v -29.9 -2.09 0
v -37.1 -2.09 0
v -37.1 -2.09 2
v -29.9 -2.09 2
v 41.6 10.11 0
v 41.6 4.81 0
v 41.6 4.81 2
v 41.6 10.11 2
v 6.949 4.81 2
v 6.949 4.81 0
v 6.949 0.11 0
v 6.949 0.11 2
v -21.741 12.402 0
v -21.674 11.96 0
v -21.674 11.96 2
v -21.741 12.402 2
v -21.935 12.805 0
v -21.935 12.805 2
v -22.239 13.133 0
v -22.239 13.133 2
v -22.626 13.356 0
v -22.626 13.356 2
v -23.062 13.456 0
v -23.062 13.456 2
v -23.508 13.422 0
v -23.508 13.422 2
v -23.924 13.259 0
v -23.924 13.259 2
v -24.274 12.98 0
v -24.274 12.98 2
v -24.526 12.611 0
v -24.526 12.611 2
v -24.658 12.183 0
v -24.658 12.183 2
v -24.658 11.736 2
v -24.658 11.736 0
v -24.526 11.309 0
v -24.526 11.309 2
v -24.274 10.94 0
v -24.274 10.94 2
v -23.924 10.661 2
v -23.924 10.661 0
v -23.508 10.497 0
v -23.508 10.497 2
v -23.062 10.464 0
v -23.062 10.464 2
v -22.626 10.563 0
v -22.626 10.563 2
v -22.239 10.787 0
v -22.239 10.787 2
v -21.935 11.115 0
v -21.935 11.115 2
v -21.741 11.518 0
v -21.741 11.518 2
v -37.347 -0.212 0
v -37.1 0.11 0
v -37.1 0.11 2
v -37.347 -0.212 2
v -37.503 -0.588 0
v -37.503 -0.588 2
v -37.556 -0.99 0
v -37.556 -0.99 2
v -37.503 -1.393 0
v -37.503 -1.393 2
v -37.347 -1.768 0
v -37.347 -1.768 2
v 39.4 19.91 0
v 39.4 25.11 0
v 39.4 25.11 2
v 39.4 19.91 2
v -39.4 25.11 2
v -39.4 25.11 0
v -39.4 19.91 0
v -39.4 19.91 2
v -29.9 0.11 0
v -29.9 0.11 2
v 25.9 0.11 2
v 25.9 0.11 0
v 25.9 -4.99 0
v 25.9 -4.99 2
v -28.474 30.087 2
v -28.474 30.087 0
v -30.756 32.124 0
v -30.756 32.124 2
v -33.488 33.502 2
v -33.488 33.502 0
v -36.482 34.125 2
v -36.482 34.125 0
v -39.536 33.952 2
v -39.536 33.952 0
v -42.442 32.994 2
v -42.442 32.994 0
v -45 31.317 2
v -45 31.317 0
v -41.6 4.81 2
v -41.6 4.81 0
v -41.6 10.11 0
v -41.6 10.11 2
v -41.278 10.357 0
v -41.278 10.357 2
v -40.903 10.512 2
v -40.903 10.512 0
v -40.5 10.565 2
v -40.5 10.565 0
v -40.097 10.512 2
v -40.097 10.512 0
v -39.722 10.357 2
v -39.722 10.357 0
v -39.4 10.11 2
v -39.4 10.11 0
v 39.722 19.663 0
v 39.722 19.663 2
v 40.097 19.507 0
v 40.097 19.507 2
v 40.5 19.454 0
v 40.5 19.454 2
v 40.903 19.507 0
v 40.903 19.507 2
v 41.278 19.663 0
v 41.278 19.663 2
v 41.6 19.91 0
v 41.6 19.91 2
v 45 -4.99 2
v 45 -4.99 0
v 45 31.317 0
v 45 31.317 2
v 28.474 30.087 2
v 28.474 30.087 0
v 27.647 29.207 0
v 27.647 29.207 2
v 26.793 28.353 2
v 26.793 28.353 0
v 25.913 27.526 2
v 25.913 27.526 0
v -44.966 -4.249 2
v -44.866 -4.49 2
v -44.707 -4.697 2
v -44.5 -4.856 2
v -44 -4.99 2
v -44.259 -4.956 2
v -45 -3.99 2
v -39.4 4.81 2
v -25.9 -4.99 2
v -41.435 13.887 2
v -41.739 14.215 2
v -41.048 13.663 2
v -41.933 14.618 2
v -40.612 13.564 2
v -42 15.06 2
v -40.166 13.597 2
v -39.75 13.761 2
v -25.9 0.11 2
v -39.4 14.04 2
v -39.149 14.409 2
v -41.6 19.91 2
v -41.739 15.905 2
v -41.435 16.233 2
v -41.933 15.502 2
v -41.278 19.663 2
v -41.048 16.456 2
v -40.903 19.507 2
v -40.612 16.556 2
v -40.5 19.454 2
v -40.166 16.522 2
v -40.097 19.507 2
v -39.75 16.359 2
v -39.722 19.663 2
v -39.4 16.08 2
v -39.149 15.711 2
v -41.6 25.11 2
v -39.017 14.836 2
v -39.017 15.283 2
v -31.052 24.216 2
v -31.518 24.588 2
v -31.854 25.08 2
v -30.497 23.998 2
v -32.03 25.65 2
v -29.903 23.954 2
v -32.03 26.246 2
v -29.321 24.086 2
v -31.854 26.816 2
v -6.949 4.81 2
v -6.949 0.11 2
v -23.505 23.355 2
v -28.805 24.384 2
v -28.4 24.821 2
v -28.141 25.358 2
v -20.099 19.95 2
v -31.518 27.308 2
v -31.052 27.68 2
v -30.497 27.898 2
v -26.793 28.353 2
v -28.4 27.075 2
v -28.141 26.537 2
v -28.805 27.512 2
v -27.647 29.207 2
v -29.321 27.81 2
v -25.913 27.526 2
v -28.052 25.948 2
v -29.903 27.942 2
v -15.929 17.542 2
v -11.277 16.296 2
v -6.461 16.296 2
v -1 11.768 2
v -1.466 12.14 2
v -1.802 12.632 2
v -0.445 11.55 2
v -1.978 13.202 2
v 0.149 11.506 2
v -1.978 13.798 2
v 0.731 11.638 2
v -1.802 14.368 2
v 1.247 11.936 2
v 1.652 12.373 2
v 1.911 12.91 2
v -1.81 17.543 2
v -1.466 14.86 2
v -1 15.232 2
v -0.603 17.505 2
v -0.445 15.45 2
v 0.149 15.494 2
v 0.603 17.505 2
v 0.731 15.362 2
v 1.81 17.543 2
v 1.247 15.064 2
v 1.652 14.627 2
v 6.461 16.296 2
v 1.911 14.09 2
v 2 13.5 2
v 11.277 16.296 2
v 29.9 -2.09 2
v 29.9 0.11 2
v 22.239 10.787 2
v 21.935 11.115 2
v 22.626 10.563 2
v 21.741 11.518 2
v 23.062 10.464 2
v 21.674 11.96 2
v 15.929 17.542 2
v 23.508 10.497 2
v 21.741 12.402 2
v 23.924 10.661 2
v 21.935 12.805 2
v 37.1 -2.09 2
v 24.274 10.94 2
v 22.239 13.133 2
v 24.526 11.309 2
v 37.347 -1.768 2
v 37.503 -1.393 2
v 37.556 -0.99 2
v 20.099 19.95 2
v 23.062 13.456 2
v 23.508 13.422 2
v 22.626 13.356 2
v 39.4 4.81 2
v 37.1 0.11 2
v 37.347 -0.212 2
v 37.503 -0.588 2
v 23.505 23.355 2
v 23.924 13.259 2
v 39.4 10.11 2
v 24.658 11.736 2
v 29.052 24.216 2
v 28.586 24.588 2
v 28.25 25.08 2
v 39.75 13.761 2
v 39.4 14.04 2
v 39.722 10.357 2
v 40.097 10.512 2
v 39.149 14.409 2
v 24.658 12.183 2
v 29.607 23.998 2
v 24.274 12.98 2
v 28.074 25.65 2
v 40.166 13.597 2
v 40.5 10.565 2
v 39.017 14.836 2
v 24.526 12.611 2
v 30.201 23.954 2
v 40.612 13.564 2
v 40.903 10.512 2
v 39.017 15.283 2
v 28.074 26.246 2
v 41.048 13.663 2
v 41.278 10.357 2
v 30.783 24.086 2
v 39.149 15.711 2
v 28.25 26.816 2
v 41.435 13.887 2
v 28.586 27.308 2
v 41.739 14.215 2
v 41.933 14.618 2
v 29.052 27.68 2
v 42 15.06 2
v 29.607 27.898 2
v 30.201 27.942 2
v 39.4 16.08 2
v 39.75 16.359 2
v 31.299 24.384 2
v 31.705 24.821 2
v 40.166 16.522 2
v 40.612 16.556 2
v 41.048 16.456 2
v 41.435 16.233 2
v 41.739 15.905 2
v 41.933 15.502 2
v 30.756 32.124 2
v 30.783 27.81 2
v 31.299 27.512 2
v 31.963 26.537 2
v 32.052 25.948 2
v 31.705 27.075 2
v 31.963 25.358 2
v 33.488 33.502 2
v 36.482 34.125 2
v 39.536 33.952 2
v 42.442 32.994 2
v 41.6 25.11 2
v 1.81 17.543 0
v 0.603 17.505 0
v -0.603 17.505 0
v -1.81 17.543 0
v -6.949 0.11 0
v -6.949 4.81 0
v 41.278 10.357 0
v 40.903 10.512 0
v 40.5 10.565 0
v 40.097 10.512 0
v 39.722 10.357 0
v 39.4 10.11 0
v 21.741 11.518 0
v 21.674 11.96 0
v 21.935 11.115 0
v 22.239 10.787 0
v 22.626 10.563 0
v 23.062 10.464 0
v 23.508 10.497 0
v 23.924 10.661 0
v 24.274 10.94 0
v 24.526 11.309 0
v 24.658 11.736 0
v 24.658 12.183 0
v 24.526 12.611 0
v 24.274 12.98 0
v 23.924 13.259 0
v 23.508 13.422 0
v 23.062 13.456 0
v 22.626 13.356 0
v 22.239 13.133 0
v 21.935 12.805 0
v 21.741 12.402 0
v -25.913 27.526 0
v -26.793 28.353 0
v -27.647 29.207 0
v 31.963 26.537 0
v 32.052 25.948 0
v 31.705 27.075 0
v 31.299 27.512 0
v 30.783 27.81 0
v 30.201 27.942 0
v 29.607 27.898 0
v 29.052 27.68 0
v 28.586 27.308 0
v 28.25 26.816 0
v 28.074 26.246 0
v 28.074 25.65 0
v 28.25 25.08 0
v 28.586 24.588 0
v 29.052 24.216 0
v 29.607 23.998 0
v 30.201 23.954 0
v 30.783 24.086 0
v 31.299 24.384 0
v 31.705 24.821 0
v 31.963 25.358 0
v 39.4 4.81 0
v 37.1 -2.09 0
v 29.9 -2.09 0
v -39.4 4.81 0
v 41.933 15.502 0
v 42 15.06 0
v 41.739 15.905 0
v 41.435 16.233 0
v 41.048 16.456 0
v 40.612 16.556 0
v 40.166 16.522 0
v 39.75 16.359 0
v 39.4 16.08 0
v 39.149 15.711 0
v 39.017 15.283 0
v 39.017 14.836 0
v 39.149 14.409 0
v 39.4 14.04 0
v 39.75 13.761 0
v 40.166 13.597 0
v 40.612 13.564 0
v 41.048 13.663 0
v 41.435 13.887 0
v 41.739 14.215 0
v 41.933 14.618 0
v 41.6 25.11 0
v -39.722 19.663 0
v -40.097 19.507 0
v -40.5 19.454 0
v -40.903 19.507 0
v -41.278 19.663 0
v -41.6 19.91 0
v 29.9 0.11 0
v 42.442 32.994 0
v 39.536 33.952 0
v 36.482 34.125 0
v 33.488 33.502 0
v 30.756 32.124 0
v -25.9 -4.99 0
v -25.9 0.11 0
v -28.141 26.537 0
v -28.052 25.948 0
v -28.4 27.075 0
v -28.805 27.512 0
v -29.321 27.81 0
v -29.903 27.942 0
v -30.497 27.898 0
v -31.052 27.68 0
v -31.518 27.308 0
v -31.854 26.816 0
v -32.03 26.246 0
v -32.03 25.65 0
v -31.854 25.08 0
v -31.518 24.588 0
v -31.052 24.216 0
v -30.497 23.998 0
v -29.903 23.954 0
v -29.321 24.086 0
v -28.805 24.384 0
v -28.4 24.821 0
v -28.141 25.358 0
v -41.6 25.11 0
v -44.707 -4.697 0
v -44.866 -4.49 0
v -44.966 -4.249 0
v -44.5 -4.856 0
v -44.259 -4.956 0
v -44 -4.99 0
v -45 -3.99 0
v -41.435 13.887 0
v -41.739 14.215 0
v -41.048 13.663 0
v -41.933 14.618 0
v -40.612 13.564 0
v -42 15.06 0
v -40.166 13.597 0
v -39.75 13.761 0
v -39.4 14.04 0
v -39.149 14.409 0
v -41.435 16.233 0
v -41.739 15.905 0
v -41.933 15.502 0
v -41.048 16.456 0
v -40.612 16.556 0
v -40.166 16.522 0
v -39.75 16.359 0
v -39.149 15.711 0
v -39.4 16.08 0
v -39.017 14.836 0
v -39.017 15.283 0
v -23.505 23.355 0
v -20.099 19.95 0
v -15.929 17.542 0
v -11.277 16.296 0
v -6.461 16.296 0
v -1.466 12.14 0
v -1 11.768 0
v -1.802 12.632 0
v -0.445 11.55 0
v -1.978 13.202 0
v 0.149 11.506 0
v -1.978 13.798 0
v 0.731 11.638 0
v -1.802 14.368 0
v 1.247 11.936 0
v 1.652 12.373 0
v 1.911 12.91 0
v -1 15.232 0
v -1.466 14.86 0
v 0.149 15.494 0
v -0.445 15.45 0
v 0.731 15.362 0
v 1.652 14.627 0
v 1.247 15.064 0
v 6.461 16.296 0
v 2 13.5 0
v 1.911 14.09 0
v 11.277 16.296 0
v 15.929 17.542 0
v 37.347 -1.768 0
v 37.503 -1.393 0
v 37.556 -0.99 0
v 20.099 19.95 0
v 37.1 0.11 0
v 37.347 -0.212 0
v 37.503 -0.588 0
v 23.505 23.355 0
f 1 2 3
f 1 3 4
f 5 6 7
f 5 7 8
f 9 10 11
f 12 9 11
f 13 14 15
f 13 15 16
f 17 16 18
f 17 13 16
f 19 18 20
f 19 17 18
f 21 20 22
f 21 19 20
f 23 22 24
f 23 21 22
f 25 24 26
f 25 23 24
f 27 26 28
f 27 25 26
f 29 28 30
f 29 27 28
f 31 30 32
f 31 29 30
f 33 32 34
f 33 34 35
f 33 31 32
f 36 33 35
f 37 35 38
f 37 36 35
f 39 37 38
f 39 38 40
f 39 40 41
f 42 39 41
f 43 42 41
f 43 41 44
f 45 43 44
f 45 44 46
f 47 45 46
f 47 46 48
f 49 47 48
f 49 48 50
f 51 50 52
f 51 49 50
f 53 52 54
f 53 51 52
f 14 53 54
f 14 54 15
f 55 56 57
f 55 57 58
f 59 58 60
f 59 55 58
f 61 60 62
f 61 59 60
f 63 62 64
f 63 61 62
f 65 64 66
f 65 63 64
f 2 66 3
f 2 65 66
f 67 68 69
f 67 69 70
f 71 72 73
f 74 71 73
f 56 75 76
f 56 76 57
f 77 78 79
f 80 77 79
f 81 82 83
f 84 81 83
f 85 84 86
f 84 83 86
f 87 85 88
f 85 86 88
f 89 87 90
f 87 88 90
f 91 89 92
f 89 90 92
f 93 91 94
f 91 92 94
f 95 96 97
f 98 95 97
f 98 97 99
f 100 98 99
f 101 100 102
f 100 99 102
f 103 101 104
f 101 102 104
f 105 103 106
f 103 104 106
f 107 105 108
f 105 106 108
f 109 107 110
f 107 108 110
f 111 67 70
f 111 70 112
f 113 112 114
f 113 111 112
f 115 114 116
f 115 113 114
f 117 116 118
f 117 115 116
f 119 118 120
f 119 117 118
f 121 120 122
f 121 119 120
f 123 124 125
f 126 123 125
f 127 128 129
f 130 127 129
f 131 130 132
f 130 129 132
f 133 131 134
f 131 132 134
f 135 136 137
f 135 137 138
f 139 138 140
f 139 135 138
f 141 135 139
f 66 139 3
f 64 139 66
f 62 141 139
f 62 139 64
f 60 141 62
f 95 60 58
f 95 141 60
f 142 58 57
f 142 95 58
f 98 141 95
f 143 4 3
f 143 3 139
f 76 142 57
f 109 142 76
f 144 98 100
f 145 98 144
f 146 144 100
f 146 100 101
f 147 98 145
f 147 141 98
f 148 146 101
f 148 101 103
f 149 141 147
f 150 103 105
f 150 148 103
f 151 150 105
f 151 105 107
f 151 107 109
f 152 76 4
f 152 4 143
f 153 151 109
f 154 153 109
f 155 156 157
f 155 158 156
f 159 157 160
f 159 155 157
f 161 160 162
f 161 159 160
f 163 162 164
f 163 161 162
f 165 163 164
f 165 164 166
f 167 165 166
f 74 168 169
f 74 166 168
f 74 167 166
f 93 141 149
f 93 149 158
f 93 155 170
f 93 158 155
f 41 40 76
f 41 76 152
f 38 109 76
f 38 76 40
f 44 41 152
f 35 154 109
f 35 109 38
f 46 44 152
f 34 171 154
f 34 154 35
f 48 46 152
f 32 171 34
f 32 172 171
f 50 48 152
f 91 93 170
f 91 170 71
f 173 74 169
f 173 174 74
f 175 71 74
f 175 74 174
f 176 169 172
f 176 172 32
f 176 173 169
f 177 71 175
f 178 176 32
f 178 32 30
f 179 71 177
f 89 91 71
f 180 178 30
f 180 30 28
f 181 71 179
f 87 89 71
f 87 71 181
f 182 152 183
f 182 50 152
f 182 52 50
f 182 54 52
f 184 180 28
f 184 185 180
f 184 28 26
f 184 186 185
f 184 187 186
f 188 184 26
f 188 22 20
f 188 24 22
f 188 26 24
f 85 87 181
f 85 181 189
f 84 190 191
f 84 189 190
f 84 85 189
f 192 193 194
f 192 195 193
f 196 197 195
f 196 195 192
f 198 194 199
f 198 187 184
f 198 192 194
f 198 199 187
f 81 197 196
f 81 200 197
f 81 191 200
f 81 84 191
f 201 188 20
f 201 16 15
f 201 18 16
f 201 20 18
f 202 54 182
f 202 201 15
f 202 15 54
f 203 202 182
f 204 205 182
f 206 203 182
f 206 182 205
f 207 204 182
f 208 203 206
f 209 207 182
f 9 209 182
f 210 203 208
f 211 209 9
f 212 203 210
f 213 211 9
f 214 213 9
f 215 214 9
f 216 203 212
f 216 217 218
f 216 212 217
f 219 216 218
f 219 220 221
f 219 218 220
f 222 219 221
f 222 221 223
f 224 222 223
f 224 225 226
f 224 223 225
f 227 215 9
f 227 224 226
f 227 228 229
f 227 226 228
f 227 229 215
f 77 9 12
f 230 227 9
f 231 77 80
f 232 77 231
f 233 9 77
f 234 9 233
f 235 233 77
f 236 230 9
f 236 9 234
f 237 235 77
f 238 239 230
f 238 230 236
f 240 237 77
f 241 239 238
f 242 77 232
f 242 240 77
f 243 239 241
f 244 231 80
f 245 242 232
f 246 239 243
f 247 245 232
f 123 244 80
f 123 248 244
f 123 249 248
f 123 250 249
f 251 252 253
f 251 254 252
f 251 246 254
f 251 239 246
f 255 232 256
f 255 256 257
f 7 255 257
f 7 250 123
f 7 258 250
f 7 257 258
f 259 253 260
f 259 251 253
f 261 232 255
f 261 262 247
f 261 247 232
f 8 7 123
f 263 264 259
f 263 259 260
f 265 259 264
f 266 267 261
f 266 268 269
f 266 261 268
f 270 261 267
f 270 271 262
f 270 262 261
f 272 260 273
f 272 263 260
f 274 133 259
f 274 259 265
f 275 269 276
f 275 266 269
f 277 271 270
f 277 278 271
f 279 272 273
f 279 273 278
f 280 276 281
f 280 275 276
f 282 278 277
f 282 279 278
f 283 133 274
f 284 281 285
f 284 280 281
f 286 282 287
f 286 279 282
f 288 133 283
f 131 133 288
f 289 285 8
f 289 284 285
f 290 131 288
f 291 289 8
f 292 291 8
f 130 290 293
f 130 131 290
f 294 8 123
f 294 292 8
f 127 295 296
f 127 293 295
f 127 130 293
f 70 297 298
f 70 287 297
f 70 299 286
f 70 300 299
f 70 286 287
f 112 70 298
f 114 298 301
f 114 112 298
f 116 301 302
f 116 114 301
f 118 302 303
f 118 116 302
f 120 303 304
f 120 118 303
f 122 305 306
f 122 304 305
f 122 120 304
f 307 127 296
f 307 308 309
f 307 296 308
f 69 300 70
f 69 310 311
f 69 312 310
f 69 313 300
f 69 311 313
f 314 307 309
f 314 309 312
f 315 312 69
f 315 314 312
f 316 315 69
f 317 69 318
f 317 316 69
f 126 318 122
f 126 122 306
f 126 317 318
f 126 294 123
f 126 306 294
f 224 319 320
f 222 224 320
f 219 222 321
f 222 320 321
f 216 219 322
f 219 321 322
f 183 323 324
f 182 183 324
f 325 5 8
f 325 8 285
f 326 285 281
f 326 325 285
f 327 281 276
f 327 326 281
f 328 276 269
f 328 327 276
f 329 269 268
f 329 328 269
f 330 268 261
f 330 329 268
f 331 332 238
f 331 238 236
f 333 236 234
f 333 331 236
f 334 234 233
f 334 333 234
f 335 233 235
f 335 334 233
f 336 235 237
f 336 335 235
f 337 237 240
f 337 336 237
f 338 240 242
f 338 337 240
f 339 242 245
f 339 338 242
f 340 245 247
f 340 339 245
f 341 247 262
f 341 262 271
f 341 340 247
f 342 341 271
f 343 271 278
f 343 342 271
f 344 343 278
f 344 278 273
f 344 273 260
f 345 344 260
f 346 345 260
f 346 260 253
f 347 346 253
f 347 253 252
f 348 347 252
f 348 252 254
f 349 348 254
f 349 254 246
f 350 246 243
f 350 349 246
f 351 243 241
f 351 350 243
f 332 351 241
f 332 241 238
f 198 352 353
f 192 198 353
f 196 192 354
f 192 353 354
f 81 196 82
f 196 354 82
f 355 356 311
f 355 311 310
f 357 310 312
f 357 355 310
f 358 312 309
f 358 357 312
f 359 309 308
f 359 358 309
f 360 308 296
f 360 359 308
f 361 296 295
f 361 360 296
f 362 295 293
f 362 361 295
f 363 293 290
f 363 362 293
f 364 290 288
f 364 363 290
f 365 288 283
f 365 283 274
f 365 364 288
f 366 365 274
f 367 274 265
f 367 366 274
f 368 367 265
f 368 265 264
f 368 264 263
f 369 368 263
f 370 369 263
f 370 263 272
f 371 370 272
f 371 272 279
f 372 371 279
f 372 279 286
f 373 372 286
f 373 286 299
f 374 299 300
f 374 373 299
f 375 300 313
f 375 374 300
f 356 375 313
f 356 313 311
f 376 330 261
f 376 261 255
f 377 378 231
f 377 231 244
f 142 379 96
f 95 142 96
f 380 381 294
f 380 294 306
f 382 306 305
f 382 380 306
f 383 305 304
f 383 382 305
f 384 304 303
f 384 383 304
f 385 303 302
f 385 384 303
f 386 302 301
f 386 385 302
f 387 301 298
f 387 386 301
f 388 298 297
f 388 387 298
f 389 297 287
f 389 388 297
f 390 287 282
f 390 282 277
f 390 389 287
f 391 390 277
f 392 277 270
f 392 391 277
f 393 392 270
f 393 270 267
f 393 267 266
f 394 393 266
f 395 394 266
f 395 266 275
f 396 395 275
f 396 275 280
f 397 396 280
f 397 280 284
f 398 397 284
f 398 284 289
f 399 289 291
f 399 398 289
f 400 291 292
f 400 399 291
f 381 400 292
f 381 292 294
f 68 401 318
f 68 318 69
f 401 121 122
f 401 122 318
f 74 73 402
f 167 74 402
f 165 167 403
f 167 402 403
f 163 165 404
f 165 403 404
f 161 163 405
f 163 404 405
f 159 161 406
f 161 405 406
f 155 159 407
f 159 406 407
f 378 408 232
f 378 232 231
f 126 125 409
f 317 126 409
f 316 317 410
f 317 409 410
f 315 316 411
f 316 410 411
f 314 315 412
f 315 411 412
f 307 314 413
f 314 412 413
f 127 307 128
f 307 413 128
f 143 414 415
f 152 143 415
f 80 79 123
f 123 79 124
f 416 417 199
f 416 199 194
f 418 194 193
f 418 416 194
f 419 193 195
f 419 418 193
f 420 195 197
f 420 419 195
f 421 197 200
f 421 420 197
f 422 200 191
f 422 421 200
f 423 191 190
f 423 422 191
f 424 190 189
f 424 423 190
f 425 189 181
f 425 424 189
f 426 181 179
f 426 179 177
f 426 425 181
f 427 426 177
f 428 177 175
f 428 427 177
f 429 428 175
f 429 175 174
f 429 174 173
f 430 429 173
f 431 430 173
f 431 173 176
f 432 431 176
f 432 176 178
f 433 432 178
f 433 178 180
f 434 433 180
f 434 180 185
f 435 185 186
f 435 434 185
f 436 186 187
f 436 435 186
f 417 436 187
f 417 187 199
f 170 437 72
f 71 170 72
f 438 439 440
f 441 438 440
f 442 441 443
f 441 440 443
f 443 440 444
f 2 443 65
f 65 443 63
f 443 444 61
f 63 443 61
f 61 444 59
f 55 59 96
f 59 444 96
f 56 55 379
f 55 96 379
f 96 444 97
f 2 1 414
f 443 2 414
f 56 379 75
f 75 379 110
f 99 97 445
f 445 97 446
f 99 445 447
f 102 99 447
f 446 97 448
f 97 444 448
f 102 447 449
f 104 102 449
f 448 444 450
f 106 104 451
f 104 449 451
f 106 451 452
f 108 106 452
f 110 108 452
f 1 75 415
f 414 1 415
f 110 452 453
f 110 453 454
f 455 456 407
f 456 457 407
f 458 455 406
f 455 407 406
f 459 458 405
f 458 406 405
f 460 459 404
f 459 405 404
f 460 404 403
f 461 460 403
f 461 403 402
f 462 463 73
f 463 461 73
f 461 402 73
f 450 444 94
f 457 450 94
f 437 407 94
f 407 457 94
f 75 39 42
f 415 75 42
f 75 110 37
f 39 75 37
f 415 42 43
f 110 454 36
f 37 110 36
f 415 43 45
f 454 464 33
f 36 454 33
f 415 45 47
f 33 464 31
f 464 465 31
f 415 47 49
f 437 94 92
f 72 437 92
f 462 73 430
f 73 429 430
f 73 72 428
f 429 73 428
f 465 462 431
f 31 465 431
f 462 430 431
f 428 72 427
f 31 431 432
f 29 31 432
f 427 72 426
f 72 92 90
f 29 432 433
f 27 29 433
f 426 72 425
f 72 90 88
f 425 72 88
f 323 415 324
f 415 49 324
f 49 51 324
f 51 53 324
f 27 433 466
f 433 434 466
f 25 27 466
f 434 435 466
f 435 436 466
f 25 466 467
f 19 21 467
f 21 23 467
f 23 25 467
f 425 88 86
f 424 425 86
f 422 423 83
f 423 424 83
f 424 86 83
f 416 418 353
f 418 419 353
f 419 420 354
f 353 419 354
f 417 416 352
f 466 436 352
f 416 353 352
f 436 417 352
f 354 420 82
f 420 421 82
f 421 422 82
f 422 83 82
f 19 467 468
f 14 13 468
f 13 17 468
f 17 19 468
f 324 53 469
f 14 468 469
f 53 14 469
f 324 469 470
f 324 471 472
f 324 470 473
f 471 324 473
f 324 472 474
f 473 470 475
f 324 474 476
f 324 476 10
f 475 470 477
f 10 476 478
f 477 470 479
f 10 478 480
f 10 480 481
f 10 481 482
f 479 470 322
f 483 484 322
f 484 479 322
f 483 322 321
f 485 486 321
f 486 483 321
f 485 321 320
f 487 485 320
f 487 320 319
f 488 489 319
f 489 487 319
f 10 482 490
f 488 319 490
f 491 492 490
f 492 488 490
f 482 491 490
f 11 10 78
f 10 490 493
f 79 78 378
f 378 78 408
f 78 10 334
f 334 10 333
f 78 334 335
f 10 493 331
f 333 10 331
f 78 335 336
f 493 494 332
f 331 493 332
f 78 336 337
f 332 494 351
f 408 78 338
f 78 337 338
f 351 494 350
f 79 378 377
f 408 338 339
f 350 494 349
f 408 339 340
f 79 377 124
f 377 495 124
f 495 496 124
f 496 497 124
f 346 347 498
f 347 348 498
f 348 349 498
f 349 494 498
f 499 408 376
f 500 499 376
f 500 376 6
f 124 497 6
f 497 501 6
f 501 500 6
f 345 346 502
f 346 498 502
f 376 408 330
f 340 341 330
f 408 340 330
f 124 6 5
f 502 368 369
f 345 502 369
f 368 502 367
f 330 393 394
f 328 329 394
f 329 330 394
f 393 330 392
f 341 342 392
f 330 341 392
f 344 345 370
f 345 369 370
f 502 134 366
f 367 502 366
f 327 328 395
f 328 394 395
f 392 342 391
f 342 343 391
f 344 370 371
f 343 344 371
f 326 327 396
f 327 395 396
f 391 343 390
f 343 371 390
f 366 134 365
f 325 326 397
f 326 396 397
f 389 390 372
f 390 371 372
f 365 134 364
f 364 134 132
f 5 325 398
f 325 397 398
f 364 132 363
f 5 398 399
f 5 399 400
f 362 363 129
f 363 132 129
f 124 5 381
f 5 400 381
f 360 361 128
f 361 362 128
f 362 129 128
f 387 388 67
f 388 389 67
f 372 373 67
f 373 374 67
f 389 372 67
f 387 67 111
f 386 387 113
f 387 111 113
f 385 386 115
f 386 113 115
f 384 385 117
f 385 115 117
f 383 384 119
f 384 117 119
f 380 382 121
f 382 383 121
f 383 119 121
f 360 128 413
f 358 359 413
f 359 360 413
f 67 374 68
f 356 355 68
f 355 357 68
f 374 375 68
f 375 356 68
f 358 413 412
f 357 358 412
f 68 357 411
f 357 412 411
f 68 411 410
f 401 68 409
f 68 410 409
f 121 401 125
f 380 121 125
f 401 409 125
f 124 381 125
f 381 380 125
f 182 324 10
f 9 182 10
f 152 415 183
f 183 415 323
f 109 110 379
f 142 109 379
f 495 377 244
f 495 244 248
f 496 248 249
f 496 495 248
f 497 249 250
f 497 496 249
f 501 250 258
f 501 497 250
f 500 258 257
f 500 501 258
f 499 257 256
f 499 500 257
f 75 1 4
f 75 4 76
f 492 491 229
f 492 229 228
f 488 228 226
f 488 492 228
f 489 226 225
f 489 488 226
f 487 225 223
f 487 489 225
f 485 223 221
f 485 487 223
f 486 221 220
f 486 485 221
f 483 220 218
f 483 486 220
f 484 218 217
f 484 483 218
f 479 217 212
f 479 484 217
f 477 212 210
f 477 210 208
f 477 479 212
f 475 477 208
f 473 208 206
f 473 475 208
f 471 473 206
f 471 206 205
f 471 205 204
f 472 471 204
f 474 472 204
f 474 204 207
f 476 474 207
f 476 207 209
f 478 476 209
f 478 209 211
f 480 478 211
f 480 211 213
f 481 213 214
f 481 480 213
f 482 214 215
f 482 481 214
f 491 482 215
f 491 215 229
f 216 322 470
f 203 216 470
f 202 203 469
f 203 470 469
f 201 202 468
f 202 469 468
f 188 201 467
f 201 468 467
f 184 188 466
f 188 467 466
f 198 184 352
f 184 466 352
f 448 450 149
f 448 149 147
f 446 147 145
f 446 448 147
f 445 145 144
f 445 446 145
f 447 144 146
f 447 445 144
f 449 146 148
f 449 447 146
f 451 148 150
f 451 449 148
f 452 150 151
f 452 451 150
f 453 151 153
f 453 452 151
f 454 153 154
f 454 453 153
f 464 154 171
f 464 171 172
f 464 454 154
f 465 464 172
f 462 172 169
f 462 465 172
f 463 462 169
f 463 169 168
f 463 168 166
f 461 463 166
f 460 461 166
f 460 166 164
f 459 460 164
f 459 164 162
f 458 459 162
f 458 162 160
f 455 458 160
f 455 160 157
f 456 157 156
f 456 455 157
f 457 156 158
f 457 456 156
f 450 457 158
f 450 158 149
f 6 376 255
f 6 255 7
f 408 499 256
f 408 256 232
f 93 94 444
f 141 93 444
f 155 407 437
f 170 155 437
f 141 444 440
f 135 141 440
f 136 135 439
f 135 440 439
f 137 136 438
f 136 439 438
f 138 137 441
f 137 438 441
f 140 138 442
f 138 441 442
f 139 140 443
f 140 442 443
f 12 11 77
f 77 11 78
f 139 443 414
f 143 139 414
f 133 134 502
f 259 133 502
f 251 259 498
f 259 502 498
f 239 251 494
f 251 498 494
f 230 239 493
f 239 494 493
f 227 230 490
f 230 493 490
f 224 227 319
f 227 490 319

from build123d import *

# Parameters (mm, degrees)
SKETCH_3_R      = 2
SKETCH_3_R_2    = 1.999999997
SKETCH_3_R_3    = 1.999999995
SKETCH_3_R_4    = 1.5
EXTRUDE_1_DEPTH = 2


with BuildPart() as part:
    # 草图3 → 凸台-拉伸1 (new body)
    with BuildSketch(Plane.XY):
        with BuildLine():
            Line((-25.9, -3.990216685), (-25.9, 0.109783315))
            Line((-25.9, 0.109783315), (-15.9, 0.109783315))
            Line((-15.9, 0.109783315), (-6.948981504, 0.109783315))
            Line((-6.948981504, 0.109783315), (-6.948981504, 4.809783315))
            Line((-6.948981504, 4.809783315), (6.948981504, 4.809783315))
            Line((6.948981504, 4.809783315), (6.948981504, 0.109783315))
            Line((6.948981504, 0.109783315), (15.9, 0.109783315))
            Line((15.9, 0.109783315), (25.9, 0.109783315))
            Line((25.9, 0.109783315), (25.9, -3.990216685))
            Line((25.9, -3.990216685), (25.9, -4.990216685))
            Line((25.9, -4.990216685), (45, -4.990216685))
            Line((45, -4.990216685), (45, -3.990216685))
            Line((45, -3.990216685), (45, 8.890084071))
            Line((45, 8.890084071), (45, 21.128606731))
            Line((45, 21.128606731), (45, 31.317051182))
            ThreePointArc((45, 31.317051182), (36.482419799, 34.124770496), (28.474223712, 30.087289143))
            ThreePointArc((28.474223712, 30.087289143), (27.223611076, 28.776388924), (25.912710857, 27.525776288))
            ThreePointArc((25.912710857, 27.525776288), (15.928828372, 17.542283516), (1.809761925, 17.542559084))
            ThreePointArc((1.809761925, 17.542559084), (0, 17.5), (-1.809761925, 17.542559084))
            ThreePointArc((-1.809761925, 17.542559084), (-15.928828372, 17.542283516), (-25.912710857, 27.525776288))
            ThreePointArc((-25.912710857, 27.525776288), (-27.223611076, 28.776388924), (-28.474223712, 30.087289143))
            ThreePointArc((-28.474223712, 30.087289143), (-36.482419799, 34.124770496), (-45, 31.317051182))
            Line((-45, 31.317051182), (-45, 21.128606731))
            Line((-45, 21.128606731), (-45, 8.890084071))
            Line((-45, 8.890084071), (-45, -3.990216685))
            ThreePointArc((-45, -3.990216685), (-44.707106781, -4.697323466), (-44, -4.990216685))
            Line((-44, -4.990216685), (-25.9, -4.990216685))
            Line((-25.9, -4.990216685), (-25.9, -3.990216685))
        make_face()
        with Locations((0, 13.5)):
            Circle(SKETCH_3_R, mode=Mode.SUBTRACT)
        with Locations((-30.0520382, 25.94796181)):
            Circle(SKETCH_3_R_2, mode=Mode.SUBTRACT)
        with Locations((30.052038207, 25.947961792)):
            Circle(SKETCH_3_R_3, mode=Mode.SUBTRACT)
        with Locations((-23.174490752, 11.959783315)):
            Circle(SKETCH_3_R_4, mode=Mode.SUBTRACT)
        with Locations(Location((23.174490752, 11.959783315, 0), (0, 0, 180))):
            Circle(SKETCH_3_R_4, mode=Mode.SUBTRACT)
        with Locations((40.5, 15.059783315)):
            Circle(SKETCH_3_R_4, mode=Mode.SUBTRACT)
        with Locations(Location((-40.5, 15.059783315, 0), (0, 0, 180))):
            Circle(SKETCH_3_R_4, mode=Mode.SUBTRACT)
        with BuildLine():
            Line((-37.1, -2.090216685), (-29.9, -2.090216685))
            Line((-29.9, -2.090216685), (-29.9, 0.109783315))
            Line((-29.9, 0.109783315), (-37.1, 0.109783315))
            ThreePointArc((-37.1, 0.109783315), (-37.555634919, -0.990216685), (-37.1, -2.090216685))
        make_face(mode=Mode.SUBTRACT)
        with BuildLine():
            Line((-41.6, 25.109783315), (-39.4, 25.109783315))
            Line((-39.4, 25.109783315), (-39.4, 19.909783315))
            ThreePointArc((-39.4, 19.909783315), (-40.5, 19.454148396), (-41.6, 19.909783315))
            Line((-41.6, 19.909783315), (-41.6, 25.109783315))
        make_face(mode=Mode.SUBTRACT)
        with BuildLine():
            Line((-39.4, 10.109783315), (-39.4, 4.809783315))
            Line((-39.4, 4.809783315), (-41.6, 4.809783315))
            Line((-41.6, 4.809783315), (-41.6, 10.109783315))
            ThreePointArc((-41.6, 10.109783315), (-40.5, 10.565418233), (-39.4, 10.109783315))
        make_face(mode=Mode.SUBTRACT)
        with BuildLine():
            Line((37.1, 0.109783315), (29.9, 0.109783315))
            Line((29.9, 0.109783315), (29.9, -2.090216685))
            Line((29.9, -2.090216685), (37.1, -2.090216685))
            ThreePointArc((37.1, -2.090216685), (37.555634919, -0.990216685), (37.1, 0.109783315))
        make_face(mode=Mode.SUBTRACT)
        with BuildLine():
            Line((41.6, 4.809783315), (41.6, 10.109783315))
            ThreePointArc((41.6, 10.109783315), (40.5, 10.565418233), (39.4, 10.109783315))
            Line((39.4, 10.109783315), (39.4, 4.809783315))
            Line((39.4, 4.809783315), (41.6, 4.809783315))
        make_face(mode=Mode.SUBTRACT)
        with BuildLine():
            Line((39.4, 25.109783315), (39.4, 19.909783315))
            ThreePointArc((39.4, 19.909783315), (40.5, 19.454148396), (41.6, 19.909783315))
            Line((41.6, 19.909783315), (41.6, 25.109783315))
            Line((41.6, 25.109783315), (39.4, 25.109783315))
        make_face(mode=Mode.SUBTRACT)
    extrude(amount=EXTRUDE_1_DEPTH)


solid = part.part
